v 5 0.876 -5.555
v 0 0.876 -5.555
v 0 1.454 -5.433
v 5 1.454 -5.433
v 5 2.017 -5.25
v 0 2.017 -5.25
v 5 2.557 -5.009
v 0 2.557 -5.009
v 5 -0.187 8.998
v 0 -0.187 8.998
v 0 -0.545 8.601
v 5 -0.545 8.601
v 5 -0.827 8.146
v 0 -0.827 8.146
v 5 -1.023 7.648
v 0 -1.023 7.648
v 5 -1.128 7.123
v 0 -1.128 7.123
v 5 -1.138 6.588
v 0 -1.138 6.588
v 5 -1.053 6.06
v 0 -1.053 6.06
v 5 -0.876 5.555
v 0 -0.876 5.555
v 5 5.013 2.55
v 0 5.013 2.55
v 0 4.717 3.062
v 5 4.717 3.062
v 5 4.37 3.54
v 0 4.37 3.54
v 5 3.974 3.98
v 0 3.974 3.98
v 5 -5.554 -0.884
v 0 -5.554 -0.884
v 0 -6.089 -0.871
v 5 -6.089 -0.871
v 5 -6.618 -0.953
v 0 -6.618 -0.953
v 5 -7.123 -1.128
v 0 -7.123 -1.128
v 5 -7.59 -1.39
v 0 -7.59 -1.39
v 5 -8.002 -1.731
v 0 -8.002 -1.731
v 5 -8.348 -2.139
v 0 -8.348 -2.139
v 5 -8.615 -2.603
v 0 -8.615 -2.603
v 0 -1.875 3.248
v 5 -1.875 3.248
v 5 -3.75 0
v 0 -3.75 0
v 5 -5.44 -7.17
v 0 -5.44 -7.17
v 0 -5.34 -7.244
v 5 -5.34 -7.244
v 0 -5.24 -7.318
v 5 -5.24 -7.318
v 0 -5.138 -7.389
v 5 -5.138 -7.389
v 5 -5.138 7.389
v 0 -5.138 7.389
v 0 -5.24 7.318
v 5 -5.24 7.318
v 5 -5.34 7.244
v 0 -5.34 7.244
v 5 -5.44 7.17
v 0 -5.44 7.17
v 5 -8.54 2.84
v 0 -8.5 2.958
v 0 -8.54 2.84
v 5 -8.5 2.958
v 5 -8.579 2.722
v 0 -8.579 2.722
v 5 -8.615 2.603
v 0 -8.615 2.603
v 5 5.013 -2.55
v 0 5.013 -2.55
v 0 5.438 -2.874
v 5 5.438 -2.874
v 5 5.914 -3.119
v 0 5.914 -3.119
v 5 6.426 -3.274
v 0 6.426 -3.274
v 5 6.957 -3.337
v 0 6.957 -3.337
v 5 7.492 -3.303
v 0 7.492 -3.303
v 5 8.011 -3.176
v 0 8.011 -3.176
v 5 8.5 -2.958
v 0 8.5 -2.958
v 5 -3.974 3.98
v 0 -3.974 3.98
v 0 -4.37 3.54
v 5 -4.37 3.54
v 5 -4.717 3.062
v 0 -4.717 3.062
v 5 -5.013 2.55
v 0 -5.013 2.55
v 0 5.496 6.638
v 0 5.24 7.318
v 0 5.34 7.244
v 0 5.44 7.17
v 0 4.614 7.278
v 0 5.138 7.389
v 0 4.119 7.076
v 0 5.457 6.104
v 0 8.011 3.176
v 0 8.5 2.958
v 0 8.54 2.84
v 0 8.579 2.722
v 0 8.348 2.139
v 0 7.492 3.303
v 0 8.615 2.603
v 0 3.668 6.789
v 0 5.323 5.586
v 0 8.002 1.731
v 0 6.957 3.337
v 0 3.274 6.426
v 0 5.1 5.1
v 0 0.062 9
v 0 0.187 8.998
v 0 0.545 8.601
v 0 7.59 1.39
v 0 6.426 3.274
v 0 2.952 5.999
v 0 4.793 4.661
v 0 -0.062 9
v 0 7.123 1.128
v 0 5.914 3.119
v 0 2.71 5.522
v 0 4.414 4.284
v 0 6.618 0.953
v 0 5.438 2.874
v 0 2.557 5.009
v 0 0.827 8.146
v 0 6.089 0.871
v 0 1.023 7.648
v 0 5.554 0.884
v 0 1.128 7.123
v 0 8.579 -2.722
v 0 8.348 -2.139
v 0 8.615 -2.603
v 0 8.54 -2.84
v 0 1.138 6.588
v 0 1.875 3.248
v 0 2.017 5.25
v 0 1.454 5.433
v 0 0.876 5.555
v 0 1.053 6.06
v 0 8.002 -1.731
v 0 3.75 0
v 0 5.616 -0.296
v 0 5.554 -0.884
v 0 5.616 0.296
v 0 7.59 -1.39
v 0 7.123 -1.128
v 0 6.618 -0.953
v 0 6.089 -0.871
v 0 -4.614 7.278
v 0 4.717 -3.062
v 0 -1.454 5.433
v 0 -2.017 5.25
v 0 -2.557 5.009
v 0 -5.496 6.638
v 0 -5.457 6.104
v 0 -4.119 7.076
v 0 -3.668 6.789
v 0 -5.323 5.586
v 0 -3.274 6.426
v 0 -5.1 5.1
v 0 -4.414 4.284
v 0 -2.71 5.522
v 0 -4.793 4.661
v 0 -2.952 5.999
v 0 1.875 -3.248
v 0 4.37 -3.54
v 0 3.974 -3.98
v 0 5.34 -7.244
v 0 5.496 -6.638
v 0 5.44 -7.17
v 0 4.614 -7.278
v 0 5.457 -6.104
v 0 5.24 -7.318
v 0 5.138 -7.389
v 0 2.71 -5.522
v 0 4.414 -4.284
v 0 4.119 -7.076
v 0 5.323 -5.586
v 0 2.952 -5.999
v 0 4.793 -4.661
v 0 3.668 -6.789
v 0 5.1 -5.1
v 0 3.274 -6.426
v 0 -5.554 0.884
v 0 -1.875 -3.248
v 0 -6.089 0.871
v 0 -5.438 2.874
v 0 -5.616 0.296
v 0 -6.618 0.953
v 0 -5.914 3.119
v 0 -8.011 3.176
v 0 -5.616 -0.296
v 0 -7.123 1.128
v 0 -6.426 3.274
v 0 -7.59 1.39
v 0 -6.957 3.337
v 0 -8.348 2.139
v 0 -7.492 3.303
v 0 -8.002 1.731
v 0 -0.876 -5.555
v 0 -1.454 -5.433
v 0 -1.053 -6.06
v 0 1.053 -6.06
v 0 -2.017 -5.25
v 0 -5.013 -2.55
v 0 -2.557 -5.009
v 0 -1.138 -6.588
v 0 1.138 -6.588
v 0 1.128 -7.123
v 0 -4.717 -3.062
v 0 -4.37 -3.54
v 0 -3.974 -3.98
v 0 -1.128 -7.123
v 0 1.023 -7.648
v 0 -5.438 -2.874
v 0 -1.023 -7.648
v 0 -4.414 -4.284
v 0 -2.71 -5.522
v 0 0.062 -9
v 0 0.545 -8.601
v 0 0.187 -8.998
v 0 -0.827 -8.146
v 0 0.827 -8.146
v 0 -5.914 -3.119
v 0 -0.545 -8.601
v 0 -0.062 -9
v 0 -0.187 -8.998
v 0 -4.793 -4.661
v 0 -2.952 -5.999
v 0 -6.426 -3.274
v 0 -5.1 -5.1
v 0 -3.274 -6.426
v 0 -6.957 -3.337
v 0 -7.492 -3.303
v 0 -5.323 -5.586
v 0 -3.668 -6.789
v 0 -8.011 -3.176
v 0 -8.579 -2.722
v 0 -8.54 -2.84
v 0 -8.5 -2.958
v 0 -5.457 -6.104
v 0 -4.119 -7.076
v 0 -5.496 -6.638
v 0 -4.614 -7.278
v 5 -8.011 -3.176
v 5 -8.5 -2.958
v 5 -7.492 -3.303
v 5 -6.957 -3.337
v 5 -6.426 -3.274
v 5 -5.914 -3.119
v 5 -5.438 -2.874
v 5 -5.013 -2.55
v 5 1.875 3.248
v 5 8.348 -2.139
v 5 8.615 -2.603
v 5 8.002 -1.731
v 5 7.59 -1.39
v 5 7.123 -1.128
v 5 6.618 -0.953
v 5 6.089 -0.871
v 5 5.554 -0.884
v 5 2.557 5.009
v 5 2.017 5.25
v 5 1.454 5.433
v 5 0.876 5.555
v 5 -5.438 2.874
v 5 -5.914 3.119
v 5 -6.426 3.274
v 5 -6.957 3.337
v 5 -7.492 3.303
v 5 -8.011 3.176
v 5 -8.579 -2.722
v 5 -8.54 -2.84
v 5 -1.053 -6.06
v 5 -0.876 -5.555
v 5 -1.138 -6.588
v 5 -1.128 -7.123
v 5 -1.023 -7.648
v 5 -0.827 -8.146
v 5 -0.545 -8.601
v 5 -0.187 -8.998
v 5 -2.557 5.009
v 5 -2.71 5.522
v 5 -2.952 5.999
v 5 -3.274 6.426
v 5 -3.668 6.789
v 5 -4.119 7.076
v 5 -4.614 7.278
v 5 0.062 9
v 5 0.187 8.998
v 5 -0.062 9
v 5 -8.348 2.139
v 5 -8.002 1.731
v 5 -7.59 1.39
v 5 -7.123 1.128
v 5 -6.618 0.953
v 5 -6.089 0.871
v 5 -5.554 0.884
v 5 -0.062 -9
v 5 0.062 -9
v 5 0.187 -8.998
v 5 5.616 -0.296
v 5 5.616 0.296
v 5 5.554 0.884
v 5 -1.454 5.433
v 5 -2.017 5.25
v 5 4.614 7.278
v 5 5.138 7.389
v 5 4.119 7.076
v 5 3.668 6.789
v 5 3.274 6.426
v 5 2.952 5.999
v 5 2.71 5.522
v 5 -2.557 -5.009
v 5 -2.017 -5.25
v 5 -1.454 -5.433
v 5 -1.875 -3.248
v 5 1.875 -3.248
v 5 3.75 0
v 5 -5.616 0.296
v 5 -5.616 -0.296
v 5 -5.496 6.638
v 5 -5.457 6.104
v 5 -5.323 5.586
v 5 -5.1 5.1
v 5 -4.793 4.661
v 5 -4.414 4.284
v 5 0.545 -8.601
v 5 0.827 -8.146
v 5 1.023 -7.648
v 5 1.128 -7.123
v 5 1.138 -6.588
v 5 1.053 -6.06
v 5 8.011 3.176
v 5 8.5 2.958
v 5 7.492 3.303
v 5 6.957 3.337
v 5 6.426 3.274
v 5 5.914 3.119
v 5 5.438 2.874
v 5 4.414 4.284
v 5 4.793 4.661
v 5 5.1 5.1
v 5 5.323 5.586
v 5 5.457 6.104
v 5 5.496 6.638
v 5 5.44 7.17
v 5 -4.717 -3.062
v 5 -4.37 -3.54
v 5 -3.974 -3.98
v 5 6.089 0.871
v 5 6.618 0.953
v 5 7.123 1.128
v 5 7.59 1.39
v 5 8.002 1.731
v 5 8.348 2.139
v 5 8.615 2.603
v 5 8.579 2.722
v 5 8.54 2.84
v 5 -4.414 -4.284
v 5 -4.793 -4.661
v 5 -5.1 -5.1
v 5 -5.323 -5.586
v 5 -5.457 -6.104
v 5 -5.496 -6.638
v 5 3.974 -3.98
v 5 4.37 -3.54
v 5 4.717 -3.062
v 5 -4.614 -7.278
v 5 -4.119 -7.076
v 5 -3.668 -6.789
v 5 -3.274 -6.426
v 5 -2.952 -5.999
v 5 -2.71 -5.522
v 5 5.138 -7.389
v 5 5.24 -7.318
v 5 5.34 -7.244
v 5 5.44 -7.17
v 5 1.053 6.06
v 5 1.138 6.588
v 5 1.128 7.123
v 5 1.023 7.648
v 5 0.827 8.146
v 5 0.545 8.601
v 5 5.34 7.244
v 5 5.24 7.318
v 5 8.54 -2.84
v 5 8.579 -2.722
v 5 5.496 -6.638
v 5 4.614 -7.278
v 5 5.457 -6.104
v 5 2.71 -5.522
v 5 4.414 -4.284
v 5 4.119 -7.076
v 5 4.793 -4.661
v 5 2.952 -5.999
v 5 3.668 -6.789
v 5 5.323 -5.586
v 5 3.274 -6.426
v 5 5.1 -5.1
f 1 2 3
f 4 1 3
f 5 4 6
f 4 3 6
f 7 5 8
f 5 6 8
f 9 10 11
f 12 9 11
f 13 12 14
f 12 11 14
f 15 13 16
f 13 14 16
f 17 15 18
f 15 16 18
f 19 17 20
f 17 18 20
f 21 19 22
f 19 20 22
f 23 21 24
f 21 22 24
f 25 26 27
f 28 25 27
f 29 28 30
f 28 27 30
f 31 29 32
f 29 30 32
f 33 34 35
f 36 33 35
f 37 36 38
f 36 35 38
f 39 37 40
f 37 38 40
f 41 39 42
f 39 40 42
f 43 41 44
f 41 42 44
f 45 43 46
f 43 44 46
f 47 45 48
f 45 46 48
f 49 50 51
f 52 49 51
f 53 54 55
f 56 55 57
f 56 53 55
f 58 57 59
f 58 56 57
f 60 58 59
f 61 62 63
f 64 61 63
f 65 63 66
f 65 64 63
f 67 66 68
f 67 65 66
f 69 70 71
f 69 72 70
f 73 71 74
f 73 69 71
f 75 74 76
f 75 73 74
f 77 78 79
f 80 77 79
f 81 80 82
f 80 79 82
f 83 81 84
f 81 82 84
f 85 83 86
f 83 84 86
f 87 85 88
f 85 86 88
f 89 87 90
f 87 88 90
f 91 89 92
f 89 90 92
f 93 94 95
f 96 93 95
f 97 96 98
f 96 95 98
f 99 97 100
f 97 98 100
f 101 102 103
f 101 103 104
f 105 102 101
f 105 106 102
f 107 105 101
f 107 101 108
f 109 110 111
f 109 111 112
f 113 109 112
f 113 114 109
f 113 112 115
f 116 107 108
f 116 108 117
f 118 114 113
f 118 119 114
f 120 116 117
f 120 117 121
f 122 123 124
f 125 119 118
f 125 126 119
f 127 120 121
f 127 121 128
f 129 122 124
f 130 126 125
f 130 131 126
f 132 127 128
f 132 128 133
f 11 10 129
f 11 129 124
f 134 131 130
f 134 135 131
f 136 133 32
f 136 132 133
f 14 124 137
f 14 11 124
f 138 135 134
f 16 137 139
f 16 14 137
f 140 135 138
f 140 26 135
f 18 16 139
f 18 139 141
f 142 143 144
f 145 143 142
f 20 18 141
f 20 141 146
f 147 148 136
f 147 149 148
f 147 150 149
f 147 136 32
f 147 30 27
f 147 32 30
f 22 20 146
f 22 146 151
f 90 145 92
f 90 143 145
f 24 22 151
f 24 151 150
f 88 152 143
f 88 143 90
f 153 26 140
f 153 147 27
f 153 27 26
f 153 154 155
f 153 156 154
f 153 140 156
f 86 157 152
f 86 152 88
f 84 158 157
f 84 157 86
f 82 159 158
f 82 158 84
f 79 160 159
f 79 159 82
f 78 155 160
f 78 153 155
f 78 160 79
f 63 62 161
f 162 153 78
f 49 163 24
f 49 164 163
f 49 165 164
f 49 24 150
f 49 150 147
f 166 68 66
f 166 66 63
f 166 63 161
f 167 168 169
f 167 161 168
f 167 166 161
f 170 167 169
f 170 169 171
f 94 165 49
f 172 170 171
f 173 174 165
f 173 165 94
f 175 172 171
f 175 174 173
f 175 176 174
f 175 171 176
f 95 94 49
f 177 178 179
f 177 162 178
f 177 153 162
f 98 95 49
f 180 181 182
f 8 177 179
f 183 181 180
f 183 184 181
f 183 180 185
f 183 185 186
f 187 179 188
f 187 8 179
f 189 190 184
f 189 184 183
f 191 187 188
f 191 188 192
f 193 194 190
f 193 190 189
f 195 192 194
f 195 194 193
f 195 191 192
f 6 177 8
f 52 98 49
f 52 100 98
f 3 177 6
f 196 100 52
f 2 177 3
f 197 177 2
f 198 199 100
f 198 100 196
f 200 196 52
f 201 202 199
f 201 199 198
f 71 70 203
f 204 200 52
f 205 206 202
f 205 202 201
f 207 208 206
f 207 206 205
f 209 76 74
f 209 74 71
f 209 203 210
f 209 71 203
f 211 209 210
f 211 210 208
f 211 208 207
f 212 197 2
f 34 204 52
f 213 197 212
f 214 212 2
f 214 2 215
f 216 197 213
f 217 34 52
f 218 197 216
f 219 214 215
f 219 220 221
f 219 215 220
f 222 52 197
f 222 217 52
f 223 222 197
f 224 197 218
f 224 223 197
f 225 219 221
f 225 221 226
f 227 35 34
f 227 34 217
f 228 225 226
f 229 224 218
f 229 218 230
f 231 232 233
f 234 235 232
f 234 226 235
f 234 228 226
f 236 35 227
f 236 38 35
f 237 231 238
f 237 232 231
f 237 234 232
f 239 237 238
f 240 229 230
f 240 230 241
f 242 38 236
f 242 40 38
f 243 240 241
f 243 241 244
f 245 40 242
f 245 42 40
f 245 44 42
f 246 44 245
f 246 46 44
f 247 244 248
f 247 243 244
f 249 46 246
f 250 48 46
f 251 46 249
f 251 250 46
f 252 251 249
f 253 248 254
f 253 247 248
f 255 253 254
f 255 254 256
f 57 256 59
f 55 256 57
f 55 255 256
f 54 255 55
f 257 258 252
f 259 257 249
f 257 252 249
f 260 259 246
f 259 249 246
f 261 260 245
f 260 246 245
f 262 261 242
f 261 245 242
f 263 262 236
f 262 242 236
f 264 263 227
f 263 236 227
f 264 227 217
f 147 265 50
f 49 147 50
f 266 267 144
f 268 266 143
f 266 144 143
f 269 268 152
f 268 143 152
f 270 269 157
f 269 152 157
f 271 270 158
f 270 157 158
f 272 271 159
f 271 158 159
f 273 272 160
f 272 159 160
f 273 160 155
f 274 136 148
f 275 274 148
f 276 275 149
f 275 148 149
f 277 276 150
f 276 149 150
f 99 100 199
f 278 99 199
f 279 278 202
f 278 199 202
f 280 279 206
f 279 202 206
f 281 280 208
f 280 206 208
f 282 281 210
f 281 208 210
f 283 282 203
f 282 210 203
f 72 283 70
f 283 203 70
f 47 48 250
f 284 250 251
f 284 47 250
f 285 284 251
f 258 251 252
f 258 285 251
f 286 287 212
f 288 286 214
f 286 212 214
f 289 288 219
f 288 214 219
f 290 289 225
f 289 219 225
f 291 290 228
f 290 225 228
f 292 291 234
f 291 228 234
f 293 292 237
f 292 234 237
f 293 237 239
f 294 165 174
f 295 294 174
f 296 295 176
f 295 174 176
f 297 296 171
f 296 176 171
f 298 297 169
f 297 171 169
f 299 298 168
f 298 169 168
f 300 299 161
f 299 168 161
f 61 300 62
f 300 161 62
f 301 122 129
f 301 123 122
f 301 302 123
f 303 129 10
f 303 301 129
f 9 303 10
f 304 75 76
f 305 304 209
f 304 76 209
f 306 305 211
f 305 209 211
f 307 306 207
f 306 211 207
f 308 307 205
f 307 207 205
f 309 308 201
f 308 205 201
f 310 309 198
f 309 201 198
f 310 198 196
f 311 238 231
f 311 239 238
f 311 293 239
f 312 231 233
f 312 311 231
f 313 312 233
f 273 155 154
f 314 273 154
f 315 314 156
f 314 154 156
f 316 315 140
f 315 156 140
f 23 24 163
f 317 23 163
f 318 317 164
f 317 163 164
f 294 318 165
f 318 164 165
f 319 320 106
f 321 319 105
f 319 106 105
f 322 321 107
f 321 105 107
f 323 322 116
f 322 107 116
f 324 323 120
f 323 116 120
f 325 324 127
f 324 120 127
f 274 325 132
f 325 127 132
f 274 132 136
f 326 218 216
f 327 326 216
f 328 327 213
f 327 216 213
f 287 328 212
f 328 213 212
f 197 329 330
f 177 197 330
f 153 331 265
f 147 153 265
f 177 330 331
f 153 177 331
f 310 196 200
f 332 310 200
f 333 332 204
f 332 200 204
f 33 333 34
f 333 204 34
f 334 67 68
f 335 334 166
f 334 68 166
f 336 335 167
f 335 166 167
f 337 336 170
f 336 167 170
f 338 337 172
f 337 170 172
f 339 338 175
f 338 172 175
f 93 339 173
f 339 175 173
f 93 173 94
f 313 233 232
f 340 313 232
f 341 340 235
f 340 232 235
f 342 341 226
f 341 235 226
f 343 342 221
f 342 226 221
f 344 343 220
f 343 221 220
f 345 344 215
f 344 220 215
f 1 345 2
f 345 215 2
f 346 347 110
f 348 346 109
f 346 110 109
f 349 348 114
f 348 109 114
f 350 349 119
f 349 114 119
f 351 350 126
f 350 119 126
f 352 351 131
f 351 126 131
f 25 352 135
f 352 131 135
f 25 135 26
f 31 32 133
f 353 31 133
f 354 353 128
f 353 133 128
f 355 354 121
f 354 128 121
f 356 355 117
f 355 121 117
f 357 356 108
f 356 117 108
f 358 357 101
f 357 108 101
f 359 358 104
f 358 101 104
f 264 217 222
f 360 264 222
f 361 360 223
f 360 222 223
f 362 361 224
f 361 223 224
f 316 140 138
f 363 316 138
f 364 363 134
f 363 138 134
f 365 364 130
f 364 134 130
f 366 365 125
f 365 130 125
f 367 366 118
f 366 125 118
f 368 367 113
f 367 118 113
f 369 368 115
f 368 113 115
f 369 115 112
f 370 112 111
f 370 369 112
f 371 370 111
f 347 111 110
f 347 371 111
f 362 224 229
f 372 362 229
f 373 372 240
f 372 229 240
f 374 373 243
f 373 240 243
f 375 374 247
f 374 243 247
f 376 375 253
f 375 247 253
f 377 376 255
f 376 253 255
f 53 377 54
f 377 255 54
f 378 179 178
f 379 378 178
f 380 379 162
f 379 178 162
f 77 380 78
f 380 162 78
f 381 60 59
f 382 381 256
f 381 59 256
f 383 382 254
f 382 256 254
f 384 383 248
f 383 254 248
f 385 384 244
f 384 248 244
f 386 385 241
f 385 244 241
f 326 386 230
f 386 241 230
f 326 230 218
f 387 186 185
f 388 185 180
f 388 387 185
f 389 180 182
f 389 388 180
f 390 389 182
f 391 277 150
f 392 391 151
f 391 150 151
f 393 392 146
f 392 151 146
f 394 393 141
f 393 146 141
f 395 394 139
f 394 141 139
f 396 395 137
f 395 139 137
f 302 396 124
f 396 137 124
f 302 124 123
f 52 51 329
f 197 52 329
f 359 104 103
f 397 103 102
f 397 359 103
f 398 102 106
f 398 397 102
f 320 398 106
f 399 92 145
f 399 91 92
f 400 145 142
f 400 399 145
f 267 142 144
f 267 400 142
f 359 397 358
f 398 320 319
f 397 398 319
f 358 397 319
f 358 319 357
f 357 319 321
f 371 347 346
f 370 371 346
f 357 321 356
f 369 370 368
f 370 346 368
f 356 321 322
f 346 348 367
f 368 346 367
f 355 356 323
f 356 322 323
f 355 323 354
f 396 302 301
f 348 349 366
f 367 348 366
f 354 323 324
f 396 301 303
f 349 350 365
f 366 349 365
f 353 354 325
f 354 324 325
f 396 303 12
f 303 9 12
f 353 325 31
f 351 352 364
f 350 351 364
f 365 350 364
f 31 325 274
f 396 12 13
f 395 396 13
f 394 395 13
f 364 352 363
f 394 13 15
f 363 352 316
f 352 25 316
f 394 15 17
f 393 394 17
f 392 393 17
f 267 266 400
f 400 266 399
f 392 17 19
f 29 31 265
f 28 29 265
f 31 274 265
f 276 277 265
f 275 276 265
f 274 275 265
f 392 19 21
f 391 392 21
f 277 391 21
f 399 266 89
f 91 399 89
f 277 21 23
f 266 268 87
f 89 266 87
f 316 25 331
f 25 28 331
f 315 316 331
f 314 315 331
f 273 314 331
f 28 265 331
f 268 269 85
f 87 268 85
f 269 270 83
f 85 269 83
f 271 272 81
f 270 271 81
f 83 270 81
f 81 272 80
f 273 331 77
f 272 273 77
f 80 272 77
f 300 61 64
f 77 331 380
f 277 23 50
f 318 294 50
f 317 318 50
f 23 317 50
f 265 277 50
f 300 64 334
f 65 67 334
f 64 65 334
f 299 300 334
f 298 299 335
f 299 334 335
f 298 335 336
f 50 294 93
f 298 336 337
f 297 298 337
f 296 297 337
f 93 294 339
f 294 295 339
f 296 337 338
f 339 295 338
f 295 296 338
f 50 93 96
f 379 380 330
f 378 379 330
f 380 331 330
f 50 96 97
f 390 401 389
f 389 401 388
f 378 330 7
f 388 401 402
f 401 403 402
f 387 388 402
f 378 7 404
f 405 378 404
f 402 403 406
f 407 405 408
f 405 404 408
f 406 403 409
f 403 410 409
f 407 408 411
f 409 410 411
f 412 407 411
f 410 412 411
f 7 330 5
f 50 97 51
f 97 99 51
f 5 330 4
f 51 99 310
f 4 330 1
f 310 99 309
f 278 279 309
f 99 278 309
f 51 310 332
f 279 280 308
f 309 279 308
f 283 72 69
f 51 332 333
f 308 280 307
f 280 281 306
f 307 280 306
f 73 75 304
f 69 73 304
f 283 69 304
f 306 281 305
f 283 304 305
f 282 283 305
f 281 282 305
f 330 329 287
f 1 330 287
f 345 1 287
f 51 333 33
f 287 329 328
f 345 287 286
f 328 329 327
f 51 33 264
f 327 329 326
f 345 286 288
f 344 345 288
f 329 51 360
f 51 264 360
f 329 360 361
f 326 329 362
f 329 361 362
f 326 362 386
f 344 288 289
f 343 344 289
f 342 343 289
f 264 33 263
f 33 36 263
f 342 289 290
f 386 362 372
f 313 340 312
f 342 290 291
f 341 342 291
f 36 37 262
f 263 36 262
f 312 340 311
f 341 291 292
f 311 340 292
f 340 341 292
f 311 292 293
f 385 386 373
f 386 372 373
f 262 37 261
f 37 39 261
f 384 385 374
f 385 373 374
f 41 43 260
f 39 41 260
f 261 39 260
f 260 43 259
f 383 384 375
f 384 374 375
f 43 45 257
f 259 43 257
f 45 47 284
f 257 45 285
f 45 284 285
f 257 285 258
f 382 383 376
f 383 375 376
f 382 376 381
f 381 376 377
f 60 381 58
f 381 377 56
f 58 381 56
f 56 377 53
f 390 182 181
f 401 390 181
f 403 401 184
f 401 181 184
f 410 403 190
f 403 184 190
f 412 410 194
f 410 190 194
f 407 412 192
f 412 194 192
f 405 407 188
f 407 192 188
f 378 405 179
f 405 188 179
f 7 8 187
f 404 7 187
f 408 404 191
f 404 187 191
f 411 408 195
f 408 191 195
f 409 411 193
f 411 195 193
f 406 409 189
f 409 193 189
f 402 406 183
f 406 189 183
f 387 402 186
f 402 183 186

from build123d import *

# Parameters (mm, degrees)
BASPROSKE_W     = 5
BASPROSKE_H     = 9
TOOTHCUT_DEPTH  = 14.674794331
TEETHCUTS_COUNT = 10
TEETHCUTS_ANGLE = 324
BORE_DEPTH      = 50.0003048


with BuildPart() as part:
    # BasProSke → Base-Revolve (revolve)
    with BuildSketch(Plane(origin=(0, 0, 0), x_dir=(1, 0, 0), z_dir=(0, 1, 0)), mode=Mode.PRIVATE) as base_revolve_sk:
        with Locations((2.5, 4.5)):
            Rectangle(BASPROSKE_W, BASPROSKE_H)
    revolve(base_revolve_sk.sketch.rotate(Axis((-10, 0, 0), (1, 0, 0)), 180), axis=Axis((-10, 0, 0), (1, 0, 0)))

    # TooCutSke → ToothCut (cut, through all)
    with BuildSketch(Plane(origin=(0, 0, 0), x_dir=(0, 0, -1), z_dir=(1, 0, 0))):
        with BuildLine():
            ThreePointArc((0.883878355, 5.554109745), (0, 5.624), (-0.883878355, 5.554109745))
            ThreePointArc((-0.883878355, 5.554109745), (-1.258245767, 7.379188248), (-2.637816971, 8.631324741))
            ThreePointArc((-2.637816971, 8.631324741), (0, 9.0254), (2.637816971, 8.631324741))
            ThreePointArc((2.637816971, 8.631324741), (1.258245767, 7.379188248), (0.883878355, 5.554109745))
        make_face()
    toothcut = extrude(amount=TOOTHCUT_DEPTH, mode=Mode.SUBTRACT)

    # TeethCuts: ToothCut ×10 about axis
    teethcuts_axis = Axis((-10, 0, 0), (1, 0, 0))
    for i in range(1, TEETHCUTS_COUNT):
        add(toothcut.rotate(teethcuts_axis, i * TEETHCUTS_ANGLE / (TEETHCUTS_COUNT - 1)), mode=Mode.SUBTRACT)

    # BorSke → Bore (cut, symmetric)
    with BuildSketch(Plane(origin=(0, 0, 0), x_dir=(0, 0, -1), z_dir=(1, 0, 0))):
        Polygon((0, 3.75), (-3.247595264, 1.875), (-3.247595264, -1.875), (0, -3.75), (3.247595264, -1.875), (3.247595264, 1.875), align=None)
    extrude(amount=BORE_DEPTH, both=True, mode=Mode.SUBTRACT)


solid = part.part
